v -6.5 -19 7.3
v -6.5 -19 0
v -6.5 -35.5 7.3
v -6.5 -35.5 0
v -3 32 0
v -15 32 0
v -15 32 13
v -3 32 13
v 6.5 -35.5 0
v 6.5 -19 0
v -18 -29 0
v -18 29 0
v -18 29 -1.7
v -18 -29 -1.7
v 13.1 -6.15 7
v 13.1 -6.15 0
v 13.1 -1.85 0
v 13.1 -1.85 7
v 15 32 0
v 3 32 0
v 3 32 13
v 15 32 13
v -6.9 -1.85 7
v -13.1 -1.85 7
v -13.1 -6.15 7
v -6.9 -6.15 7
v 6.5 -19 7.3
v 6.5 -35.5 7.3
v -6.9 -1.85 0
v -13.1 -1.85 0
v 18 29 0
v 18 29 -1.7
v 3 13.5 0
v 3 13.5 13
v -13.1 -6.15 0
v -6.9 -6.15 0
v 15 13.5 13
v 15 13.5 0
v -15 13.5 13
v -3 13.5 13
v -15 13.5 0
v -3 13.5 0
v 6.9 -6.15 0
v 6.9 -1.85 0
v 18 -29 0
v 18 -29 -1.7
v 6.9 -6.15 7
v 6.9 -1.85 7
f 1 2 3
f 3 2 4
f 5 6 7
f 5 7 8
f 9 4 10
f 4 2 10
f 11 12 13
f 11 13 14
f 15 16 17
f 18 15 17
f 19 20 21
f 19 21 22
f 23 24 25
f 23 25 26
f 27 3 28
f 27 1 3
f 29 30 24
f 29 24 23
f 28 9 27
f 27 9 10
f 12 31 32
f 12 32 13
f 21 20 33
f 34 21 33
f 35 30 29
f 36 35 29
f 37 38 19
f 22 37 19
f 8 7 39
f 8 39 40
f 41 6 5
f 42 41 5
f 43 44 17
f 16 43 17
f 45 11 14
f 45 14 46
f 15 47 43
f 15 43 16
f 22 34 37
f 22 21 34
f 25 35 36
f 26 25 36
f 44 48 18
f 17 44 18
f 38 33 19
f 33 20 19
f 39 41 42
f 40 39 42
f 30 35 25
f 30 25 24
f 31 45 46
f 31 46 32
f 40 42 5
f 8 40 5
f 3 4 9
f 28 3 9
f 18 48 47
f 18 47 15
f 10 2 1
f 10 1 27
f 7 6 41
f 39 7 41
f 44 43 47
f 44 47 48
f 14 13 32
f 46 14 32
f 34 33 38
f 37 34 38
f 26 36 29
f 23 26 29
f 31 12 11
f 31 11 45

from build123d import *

# Parameters (mm, degrees)
F0_W     = 6.2
F0_H     = 4.3
F0_W_2   = 12
F0_H_2   = 15.5
F0_W_3   = 13
F0_H_3   = 10
F1_DEPTH = 1.7
F0_H_4   = 6.5
F2_DEPTH = 7.3
F0_H_5   = 3
F3_DEPTH = 13
F4_DEPTH = 7


with BuildPart() as f1:
    # F0 (on Top) → F1 (new body)
    with BuildSketch(Plane.XY):
        Polygon((18, -29), (18, 29), (15, 29), (15, 13.5), (3, 13.5), (3, 29), (-3, 29), (-3, 13.5), (-15, 13.5), (-15, 29), (-18, 29), (-18, -29), (-6.5, -29), (-6.5, -19), (6.5, -19), (6.5, -29), align=None)
        with Locations((-10, -4)):
            Rectangle(F0_W, F0_H, mode=Mode.SUBTRACT)
        with Locations((10, -4)):
            Rectangle(F0_W, F0_H, mode=Mode.SUBTRACT)
        with Locations((9, 21.25)):
            Rectangle(F0_W_2, F0_H_2)
        with Locations((-9, 21.25)):
            Rectangle(F0_W_2, F0_H_2)
        with Locations((0, -24)):
            Rectangle(F0_W_3, F0_H_3)
        with Locations((10, -4)):
            Rectangle(F0_W, F0_H)
        with Locations((-10, -4)):
            Rectangle(F0_W, F0_H)
    extrude(amount=-F1_DEPTH)


with BuildPart() as f2:
    # F0 (on Top) → F2 (new body)
    with BuildSketch(Plane.XY):
        with Locations((0, -32.25)):
            Rectangle(F0_W_3, F0_H_4)
        with Locations((0, -24)):
            Rectangle(F0_W_3, F0_H_3)
    extrude(amount=F2_DEPTH)


with BuildPart() as f3:
    # F0 (on Top) → F3 (new body)
    with BuildSketch(Plane.XY):
        with Locations((-9, 30.5)):
            Rectangle(F0_W_2, F0_H_5)
        with Locations((-9, 21.25)):
            Rectangle(F0_W_2, F0_H_2)
    extrude(amount=F3_DEPTH)


with BuildPart() as f3b:
    # F0 (on Top) → F3, piece 2 (new body)
    with BuildSketch(Plane.XY):
        with Locations((9, 21.25)):
            Rectangle(F0_W_2, F0_H_2)
        with Locations((9, 30.5)):
            Rectangle(F0_W_2, F0_H_5)
    extrude(amount=F3_DEPTH)


with BuildPart() as f4:
    # F0 (on Top) → F4 (new body)
    with BuildSketch(Plane.XY):
        with Locations((10, -4)):
            Rectangle(F0_W, F0_H)
    extrude(amount=F4_DEPTH)


with BuildPart() as f4b:
    # F0 (on Top) → F4, piece 2 (new body)
    with BuildSketch(Plane.XY):
        with Locations((-10, -4)):
            Rectangle(F0_W, F0_H)
    extrude(amount=F4_DEPTH)


solid = Compound([f1.part, f2.part, f3.part, f3b.part, f4.part, f4b.part])
